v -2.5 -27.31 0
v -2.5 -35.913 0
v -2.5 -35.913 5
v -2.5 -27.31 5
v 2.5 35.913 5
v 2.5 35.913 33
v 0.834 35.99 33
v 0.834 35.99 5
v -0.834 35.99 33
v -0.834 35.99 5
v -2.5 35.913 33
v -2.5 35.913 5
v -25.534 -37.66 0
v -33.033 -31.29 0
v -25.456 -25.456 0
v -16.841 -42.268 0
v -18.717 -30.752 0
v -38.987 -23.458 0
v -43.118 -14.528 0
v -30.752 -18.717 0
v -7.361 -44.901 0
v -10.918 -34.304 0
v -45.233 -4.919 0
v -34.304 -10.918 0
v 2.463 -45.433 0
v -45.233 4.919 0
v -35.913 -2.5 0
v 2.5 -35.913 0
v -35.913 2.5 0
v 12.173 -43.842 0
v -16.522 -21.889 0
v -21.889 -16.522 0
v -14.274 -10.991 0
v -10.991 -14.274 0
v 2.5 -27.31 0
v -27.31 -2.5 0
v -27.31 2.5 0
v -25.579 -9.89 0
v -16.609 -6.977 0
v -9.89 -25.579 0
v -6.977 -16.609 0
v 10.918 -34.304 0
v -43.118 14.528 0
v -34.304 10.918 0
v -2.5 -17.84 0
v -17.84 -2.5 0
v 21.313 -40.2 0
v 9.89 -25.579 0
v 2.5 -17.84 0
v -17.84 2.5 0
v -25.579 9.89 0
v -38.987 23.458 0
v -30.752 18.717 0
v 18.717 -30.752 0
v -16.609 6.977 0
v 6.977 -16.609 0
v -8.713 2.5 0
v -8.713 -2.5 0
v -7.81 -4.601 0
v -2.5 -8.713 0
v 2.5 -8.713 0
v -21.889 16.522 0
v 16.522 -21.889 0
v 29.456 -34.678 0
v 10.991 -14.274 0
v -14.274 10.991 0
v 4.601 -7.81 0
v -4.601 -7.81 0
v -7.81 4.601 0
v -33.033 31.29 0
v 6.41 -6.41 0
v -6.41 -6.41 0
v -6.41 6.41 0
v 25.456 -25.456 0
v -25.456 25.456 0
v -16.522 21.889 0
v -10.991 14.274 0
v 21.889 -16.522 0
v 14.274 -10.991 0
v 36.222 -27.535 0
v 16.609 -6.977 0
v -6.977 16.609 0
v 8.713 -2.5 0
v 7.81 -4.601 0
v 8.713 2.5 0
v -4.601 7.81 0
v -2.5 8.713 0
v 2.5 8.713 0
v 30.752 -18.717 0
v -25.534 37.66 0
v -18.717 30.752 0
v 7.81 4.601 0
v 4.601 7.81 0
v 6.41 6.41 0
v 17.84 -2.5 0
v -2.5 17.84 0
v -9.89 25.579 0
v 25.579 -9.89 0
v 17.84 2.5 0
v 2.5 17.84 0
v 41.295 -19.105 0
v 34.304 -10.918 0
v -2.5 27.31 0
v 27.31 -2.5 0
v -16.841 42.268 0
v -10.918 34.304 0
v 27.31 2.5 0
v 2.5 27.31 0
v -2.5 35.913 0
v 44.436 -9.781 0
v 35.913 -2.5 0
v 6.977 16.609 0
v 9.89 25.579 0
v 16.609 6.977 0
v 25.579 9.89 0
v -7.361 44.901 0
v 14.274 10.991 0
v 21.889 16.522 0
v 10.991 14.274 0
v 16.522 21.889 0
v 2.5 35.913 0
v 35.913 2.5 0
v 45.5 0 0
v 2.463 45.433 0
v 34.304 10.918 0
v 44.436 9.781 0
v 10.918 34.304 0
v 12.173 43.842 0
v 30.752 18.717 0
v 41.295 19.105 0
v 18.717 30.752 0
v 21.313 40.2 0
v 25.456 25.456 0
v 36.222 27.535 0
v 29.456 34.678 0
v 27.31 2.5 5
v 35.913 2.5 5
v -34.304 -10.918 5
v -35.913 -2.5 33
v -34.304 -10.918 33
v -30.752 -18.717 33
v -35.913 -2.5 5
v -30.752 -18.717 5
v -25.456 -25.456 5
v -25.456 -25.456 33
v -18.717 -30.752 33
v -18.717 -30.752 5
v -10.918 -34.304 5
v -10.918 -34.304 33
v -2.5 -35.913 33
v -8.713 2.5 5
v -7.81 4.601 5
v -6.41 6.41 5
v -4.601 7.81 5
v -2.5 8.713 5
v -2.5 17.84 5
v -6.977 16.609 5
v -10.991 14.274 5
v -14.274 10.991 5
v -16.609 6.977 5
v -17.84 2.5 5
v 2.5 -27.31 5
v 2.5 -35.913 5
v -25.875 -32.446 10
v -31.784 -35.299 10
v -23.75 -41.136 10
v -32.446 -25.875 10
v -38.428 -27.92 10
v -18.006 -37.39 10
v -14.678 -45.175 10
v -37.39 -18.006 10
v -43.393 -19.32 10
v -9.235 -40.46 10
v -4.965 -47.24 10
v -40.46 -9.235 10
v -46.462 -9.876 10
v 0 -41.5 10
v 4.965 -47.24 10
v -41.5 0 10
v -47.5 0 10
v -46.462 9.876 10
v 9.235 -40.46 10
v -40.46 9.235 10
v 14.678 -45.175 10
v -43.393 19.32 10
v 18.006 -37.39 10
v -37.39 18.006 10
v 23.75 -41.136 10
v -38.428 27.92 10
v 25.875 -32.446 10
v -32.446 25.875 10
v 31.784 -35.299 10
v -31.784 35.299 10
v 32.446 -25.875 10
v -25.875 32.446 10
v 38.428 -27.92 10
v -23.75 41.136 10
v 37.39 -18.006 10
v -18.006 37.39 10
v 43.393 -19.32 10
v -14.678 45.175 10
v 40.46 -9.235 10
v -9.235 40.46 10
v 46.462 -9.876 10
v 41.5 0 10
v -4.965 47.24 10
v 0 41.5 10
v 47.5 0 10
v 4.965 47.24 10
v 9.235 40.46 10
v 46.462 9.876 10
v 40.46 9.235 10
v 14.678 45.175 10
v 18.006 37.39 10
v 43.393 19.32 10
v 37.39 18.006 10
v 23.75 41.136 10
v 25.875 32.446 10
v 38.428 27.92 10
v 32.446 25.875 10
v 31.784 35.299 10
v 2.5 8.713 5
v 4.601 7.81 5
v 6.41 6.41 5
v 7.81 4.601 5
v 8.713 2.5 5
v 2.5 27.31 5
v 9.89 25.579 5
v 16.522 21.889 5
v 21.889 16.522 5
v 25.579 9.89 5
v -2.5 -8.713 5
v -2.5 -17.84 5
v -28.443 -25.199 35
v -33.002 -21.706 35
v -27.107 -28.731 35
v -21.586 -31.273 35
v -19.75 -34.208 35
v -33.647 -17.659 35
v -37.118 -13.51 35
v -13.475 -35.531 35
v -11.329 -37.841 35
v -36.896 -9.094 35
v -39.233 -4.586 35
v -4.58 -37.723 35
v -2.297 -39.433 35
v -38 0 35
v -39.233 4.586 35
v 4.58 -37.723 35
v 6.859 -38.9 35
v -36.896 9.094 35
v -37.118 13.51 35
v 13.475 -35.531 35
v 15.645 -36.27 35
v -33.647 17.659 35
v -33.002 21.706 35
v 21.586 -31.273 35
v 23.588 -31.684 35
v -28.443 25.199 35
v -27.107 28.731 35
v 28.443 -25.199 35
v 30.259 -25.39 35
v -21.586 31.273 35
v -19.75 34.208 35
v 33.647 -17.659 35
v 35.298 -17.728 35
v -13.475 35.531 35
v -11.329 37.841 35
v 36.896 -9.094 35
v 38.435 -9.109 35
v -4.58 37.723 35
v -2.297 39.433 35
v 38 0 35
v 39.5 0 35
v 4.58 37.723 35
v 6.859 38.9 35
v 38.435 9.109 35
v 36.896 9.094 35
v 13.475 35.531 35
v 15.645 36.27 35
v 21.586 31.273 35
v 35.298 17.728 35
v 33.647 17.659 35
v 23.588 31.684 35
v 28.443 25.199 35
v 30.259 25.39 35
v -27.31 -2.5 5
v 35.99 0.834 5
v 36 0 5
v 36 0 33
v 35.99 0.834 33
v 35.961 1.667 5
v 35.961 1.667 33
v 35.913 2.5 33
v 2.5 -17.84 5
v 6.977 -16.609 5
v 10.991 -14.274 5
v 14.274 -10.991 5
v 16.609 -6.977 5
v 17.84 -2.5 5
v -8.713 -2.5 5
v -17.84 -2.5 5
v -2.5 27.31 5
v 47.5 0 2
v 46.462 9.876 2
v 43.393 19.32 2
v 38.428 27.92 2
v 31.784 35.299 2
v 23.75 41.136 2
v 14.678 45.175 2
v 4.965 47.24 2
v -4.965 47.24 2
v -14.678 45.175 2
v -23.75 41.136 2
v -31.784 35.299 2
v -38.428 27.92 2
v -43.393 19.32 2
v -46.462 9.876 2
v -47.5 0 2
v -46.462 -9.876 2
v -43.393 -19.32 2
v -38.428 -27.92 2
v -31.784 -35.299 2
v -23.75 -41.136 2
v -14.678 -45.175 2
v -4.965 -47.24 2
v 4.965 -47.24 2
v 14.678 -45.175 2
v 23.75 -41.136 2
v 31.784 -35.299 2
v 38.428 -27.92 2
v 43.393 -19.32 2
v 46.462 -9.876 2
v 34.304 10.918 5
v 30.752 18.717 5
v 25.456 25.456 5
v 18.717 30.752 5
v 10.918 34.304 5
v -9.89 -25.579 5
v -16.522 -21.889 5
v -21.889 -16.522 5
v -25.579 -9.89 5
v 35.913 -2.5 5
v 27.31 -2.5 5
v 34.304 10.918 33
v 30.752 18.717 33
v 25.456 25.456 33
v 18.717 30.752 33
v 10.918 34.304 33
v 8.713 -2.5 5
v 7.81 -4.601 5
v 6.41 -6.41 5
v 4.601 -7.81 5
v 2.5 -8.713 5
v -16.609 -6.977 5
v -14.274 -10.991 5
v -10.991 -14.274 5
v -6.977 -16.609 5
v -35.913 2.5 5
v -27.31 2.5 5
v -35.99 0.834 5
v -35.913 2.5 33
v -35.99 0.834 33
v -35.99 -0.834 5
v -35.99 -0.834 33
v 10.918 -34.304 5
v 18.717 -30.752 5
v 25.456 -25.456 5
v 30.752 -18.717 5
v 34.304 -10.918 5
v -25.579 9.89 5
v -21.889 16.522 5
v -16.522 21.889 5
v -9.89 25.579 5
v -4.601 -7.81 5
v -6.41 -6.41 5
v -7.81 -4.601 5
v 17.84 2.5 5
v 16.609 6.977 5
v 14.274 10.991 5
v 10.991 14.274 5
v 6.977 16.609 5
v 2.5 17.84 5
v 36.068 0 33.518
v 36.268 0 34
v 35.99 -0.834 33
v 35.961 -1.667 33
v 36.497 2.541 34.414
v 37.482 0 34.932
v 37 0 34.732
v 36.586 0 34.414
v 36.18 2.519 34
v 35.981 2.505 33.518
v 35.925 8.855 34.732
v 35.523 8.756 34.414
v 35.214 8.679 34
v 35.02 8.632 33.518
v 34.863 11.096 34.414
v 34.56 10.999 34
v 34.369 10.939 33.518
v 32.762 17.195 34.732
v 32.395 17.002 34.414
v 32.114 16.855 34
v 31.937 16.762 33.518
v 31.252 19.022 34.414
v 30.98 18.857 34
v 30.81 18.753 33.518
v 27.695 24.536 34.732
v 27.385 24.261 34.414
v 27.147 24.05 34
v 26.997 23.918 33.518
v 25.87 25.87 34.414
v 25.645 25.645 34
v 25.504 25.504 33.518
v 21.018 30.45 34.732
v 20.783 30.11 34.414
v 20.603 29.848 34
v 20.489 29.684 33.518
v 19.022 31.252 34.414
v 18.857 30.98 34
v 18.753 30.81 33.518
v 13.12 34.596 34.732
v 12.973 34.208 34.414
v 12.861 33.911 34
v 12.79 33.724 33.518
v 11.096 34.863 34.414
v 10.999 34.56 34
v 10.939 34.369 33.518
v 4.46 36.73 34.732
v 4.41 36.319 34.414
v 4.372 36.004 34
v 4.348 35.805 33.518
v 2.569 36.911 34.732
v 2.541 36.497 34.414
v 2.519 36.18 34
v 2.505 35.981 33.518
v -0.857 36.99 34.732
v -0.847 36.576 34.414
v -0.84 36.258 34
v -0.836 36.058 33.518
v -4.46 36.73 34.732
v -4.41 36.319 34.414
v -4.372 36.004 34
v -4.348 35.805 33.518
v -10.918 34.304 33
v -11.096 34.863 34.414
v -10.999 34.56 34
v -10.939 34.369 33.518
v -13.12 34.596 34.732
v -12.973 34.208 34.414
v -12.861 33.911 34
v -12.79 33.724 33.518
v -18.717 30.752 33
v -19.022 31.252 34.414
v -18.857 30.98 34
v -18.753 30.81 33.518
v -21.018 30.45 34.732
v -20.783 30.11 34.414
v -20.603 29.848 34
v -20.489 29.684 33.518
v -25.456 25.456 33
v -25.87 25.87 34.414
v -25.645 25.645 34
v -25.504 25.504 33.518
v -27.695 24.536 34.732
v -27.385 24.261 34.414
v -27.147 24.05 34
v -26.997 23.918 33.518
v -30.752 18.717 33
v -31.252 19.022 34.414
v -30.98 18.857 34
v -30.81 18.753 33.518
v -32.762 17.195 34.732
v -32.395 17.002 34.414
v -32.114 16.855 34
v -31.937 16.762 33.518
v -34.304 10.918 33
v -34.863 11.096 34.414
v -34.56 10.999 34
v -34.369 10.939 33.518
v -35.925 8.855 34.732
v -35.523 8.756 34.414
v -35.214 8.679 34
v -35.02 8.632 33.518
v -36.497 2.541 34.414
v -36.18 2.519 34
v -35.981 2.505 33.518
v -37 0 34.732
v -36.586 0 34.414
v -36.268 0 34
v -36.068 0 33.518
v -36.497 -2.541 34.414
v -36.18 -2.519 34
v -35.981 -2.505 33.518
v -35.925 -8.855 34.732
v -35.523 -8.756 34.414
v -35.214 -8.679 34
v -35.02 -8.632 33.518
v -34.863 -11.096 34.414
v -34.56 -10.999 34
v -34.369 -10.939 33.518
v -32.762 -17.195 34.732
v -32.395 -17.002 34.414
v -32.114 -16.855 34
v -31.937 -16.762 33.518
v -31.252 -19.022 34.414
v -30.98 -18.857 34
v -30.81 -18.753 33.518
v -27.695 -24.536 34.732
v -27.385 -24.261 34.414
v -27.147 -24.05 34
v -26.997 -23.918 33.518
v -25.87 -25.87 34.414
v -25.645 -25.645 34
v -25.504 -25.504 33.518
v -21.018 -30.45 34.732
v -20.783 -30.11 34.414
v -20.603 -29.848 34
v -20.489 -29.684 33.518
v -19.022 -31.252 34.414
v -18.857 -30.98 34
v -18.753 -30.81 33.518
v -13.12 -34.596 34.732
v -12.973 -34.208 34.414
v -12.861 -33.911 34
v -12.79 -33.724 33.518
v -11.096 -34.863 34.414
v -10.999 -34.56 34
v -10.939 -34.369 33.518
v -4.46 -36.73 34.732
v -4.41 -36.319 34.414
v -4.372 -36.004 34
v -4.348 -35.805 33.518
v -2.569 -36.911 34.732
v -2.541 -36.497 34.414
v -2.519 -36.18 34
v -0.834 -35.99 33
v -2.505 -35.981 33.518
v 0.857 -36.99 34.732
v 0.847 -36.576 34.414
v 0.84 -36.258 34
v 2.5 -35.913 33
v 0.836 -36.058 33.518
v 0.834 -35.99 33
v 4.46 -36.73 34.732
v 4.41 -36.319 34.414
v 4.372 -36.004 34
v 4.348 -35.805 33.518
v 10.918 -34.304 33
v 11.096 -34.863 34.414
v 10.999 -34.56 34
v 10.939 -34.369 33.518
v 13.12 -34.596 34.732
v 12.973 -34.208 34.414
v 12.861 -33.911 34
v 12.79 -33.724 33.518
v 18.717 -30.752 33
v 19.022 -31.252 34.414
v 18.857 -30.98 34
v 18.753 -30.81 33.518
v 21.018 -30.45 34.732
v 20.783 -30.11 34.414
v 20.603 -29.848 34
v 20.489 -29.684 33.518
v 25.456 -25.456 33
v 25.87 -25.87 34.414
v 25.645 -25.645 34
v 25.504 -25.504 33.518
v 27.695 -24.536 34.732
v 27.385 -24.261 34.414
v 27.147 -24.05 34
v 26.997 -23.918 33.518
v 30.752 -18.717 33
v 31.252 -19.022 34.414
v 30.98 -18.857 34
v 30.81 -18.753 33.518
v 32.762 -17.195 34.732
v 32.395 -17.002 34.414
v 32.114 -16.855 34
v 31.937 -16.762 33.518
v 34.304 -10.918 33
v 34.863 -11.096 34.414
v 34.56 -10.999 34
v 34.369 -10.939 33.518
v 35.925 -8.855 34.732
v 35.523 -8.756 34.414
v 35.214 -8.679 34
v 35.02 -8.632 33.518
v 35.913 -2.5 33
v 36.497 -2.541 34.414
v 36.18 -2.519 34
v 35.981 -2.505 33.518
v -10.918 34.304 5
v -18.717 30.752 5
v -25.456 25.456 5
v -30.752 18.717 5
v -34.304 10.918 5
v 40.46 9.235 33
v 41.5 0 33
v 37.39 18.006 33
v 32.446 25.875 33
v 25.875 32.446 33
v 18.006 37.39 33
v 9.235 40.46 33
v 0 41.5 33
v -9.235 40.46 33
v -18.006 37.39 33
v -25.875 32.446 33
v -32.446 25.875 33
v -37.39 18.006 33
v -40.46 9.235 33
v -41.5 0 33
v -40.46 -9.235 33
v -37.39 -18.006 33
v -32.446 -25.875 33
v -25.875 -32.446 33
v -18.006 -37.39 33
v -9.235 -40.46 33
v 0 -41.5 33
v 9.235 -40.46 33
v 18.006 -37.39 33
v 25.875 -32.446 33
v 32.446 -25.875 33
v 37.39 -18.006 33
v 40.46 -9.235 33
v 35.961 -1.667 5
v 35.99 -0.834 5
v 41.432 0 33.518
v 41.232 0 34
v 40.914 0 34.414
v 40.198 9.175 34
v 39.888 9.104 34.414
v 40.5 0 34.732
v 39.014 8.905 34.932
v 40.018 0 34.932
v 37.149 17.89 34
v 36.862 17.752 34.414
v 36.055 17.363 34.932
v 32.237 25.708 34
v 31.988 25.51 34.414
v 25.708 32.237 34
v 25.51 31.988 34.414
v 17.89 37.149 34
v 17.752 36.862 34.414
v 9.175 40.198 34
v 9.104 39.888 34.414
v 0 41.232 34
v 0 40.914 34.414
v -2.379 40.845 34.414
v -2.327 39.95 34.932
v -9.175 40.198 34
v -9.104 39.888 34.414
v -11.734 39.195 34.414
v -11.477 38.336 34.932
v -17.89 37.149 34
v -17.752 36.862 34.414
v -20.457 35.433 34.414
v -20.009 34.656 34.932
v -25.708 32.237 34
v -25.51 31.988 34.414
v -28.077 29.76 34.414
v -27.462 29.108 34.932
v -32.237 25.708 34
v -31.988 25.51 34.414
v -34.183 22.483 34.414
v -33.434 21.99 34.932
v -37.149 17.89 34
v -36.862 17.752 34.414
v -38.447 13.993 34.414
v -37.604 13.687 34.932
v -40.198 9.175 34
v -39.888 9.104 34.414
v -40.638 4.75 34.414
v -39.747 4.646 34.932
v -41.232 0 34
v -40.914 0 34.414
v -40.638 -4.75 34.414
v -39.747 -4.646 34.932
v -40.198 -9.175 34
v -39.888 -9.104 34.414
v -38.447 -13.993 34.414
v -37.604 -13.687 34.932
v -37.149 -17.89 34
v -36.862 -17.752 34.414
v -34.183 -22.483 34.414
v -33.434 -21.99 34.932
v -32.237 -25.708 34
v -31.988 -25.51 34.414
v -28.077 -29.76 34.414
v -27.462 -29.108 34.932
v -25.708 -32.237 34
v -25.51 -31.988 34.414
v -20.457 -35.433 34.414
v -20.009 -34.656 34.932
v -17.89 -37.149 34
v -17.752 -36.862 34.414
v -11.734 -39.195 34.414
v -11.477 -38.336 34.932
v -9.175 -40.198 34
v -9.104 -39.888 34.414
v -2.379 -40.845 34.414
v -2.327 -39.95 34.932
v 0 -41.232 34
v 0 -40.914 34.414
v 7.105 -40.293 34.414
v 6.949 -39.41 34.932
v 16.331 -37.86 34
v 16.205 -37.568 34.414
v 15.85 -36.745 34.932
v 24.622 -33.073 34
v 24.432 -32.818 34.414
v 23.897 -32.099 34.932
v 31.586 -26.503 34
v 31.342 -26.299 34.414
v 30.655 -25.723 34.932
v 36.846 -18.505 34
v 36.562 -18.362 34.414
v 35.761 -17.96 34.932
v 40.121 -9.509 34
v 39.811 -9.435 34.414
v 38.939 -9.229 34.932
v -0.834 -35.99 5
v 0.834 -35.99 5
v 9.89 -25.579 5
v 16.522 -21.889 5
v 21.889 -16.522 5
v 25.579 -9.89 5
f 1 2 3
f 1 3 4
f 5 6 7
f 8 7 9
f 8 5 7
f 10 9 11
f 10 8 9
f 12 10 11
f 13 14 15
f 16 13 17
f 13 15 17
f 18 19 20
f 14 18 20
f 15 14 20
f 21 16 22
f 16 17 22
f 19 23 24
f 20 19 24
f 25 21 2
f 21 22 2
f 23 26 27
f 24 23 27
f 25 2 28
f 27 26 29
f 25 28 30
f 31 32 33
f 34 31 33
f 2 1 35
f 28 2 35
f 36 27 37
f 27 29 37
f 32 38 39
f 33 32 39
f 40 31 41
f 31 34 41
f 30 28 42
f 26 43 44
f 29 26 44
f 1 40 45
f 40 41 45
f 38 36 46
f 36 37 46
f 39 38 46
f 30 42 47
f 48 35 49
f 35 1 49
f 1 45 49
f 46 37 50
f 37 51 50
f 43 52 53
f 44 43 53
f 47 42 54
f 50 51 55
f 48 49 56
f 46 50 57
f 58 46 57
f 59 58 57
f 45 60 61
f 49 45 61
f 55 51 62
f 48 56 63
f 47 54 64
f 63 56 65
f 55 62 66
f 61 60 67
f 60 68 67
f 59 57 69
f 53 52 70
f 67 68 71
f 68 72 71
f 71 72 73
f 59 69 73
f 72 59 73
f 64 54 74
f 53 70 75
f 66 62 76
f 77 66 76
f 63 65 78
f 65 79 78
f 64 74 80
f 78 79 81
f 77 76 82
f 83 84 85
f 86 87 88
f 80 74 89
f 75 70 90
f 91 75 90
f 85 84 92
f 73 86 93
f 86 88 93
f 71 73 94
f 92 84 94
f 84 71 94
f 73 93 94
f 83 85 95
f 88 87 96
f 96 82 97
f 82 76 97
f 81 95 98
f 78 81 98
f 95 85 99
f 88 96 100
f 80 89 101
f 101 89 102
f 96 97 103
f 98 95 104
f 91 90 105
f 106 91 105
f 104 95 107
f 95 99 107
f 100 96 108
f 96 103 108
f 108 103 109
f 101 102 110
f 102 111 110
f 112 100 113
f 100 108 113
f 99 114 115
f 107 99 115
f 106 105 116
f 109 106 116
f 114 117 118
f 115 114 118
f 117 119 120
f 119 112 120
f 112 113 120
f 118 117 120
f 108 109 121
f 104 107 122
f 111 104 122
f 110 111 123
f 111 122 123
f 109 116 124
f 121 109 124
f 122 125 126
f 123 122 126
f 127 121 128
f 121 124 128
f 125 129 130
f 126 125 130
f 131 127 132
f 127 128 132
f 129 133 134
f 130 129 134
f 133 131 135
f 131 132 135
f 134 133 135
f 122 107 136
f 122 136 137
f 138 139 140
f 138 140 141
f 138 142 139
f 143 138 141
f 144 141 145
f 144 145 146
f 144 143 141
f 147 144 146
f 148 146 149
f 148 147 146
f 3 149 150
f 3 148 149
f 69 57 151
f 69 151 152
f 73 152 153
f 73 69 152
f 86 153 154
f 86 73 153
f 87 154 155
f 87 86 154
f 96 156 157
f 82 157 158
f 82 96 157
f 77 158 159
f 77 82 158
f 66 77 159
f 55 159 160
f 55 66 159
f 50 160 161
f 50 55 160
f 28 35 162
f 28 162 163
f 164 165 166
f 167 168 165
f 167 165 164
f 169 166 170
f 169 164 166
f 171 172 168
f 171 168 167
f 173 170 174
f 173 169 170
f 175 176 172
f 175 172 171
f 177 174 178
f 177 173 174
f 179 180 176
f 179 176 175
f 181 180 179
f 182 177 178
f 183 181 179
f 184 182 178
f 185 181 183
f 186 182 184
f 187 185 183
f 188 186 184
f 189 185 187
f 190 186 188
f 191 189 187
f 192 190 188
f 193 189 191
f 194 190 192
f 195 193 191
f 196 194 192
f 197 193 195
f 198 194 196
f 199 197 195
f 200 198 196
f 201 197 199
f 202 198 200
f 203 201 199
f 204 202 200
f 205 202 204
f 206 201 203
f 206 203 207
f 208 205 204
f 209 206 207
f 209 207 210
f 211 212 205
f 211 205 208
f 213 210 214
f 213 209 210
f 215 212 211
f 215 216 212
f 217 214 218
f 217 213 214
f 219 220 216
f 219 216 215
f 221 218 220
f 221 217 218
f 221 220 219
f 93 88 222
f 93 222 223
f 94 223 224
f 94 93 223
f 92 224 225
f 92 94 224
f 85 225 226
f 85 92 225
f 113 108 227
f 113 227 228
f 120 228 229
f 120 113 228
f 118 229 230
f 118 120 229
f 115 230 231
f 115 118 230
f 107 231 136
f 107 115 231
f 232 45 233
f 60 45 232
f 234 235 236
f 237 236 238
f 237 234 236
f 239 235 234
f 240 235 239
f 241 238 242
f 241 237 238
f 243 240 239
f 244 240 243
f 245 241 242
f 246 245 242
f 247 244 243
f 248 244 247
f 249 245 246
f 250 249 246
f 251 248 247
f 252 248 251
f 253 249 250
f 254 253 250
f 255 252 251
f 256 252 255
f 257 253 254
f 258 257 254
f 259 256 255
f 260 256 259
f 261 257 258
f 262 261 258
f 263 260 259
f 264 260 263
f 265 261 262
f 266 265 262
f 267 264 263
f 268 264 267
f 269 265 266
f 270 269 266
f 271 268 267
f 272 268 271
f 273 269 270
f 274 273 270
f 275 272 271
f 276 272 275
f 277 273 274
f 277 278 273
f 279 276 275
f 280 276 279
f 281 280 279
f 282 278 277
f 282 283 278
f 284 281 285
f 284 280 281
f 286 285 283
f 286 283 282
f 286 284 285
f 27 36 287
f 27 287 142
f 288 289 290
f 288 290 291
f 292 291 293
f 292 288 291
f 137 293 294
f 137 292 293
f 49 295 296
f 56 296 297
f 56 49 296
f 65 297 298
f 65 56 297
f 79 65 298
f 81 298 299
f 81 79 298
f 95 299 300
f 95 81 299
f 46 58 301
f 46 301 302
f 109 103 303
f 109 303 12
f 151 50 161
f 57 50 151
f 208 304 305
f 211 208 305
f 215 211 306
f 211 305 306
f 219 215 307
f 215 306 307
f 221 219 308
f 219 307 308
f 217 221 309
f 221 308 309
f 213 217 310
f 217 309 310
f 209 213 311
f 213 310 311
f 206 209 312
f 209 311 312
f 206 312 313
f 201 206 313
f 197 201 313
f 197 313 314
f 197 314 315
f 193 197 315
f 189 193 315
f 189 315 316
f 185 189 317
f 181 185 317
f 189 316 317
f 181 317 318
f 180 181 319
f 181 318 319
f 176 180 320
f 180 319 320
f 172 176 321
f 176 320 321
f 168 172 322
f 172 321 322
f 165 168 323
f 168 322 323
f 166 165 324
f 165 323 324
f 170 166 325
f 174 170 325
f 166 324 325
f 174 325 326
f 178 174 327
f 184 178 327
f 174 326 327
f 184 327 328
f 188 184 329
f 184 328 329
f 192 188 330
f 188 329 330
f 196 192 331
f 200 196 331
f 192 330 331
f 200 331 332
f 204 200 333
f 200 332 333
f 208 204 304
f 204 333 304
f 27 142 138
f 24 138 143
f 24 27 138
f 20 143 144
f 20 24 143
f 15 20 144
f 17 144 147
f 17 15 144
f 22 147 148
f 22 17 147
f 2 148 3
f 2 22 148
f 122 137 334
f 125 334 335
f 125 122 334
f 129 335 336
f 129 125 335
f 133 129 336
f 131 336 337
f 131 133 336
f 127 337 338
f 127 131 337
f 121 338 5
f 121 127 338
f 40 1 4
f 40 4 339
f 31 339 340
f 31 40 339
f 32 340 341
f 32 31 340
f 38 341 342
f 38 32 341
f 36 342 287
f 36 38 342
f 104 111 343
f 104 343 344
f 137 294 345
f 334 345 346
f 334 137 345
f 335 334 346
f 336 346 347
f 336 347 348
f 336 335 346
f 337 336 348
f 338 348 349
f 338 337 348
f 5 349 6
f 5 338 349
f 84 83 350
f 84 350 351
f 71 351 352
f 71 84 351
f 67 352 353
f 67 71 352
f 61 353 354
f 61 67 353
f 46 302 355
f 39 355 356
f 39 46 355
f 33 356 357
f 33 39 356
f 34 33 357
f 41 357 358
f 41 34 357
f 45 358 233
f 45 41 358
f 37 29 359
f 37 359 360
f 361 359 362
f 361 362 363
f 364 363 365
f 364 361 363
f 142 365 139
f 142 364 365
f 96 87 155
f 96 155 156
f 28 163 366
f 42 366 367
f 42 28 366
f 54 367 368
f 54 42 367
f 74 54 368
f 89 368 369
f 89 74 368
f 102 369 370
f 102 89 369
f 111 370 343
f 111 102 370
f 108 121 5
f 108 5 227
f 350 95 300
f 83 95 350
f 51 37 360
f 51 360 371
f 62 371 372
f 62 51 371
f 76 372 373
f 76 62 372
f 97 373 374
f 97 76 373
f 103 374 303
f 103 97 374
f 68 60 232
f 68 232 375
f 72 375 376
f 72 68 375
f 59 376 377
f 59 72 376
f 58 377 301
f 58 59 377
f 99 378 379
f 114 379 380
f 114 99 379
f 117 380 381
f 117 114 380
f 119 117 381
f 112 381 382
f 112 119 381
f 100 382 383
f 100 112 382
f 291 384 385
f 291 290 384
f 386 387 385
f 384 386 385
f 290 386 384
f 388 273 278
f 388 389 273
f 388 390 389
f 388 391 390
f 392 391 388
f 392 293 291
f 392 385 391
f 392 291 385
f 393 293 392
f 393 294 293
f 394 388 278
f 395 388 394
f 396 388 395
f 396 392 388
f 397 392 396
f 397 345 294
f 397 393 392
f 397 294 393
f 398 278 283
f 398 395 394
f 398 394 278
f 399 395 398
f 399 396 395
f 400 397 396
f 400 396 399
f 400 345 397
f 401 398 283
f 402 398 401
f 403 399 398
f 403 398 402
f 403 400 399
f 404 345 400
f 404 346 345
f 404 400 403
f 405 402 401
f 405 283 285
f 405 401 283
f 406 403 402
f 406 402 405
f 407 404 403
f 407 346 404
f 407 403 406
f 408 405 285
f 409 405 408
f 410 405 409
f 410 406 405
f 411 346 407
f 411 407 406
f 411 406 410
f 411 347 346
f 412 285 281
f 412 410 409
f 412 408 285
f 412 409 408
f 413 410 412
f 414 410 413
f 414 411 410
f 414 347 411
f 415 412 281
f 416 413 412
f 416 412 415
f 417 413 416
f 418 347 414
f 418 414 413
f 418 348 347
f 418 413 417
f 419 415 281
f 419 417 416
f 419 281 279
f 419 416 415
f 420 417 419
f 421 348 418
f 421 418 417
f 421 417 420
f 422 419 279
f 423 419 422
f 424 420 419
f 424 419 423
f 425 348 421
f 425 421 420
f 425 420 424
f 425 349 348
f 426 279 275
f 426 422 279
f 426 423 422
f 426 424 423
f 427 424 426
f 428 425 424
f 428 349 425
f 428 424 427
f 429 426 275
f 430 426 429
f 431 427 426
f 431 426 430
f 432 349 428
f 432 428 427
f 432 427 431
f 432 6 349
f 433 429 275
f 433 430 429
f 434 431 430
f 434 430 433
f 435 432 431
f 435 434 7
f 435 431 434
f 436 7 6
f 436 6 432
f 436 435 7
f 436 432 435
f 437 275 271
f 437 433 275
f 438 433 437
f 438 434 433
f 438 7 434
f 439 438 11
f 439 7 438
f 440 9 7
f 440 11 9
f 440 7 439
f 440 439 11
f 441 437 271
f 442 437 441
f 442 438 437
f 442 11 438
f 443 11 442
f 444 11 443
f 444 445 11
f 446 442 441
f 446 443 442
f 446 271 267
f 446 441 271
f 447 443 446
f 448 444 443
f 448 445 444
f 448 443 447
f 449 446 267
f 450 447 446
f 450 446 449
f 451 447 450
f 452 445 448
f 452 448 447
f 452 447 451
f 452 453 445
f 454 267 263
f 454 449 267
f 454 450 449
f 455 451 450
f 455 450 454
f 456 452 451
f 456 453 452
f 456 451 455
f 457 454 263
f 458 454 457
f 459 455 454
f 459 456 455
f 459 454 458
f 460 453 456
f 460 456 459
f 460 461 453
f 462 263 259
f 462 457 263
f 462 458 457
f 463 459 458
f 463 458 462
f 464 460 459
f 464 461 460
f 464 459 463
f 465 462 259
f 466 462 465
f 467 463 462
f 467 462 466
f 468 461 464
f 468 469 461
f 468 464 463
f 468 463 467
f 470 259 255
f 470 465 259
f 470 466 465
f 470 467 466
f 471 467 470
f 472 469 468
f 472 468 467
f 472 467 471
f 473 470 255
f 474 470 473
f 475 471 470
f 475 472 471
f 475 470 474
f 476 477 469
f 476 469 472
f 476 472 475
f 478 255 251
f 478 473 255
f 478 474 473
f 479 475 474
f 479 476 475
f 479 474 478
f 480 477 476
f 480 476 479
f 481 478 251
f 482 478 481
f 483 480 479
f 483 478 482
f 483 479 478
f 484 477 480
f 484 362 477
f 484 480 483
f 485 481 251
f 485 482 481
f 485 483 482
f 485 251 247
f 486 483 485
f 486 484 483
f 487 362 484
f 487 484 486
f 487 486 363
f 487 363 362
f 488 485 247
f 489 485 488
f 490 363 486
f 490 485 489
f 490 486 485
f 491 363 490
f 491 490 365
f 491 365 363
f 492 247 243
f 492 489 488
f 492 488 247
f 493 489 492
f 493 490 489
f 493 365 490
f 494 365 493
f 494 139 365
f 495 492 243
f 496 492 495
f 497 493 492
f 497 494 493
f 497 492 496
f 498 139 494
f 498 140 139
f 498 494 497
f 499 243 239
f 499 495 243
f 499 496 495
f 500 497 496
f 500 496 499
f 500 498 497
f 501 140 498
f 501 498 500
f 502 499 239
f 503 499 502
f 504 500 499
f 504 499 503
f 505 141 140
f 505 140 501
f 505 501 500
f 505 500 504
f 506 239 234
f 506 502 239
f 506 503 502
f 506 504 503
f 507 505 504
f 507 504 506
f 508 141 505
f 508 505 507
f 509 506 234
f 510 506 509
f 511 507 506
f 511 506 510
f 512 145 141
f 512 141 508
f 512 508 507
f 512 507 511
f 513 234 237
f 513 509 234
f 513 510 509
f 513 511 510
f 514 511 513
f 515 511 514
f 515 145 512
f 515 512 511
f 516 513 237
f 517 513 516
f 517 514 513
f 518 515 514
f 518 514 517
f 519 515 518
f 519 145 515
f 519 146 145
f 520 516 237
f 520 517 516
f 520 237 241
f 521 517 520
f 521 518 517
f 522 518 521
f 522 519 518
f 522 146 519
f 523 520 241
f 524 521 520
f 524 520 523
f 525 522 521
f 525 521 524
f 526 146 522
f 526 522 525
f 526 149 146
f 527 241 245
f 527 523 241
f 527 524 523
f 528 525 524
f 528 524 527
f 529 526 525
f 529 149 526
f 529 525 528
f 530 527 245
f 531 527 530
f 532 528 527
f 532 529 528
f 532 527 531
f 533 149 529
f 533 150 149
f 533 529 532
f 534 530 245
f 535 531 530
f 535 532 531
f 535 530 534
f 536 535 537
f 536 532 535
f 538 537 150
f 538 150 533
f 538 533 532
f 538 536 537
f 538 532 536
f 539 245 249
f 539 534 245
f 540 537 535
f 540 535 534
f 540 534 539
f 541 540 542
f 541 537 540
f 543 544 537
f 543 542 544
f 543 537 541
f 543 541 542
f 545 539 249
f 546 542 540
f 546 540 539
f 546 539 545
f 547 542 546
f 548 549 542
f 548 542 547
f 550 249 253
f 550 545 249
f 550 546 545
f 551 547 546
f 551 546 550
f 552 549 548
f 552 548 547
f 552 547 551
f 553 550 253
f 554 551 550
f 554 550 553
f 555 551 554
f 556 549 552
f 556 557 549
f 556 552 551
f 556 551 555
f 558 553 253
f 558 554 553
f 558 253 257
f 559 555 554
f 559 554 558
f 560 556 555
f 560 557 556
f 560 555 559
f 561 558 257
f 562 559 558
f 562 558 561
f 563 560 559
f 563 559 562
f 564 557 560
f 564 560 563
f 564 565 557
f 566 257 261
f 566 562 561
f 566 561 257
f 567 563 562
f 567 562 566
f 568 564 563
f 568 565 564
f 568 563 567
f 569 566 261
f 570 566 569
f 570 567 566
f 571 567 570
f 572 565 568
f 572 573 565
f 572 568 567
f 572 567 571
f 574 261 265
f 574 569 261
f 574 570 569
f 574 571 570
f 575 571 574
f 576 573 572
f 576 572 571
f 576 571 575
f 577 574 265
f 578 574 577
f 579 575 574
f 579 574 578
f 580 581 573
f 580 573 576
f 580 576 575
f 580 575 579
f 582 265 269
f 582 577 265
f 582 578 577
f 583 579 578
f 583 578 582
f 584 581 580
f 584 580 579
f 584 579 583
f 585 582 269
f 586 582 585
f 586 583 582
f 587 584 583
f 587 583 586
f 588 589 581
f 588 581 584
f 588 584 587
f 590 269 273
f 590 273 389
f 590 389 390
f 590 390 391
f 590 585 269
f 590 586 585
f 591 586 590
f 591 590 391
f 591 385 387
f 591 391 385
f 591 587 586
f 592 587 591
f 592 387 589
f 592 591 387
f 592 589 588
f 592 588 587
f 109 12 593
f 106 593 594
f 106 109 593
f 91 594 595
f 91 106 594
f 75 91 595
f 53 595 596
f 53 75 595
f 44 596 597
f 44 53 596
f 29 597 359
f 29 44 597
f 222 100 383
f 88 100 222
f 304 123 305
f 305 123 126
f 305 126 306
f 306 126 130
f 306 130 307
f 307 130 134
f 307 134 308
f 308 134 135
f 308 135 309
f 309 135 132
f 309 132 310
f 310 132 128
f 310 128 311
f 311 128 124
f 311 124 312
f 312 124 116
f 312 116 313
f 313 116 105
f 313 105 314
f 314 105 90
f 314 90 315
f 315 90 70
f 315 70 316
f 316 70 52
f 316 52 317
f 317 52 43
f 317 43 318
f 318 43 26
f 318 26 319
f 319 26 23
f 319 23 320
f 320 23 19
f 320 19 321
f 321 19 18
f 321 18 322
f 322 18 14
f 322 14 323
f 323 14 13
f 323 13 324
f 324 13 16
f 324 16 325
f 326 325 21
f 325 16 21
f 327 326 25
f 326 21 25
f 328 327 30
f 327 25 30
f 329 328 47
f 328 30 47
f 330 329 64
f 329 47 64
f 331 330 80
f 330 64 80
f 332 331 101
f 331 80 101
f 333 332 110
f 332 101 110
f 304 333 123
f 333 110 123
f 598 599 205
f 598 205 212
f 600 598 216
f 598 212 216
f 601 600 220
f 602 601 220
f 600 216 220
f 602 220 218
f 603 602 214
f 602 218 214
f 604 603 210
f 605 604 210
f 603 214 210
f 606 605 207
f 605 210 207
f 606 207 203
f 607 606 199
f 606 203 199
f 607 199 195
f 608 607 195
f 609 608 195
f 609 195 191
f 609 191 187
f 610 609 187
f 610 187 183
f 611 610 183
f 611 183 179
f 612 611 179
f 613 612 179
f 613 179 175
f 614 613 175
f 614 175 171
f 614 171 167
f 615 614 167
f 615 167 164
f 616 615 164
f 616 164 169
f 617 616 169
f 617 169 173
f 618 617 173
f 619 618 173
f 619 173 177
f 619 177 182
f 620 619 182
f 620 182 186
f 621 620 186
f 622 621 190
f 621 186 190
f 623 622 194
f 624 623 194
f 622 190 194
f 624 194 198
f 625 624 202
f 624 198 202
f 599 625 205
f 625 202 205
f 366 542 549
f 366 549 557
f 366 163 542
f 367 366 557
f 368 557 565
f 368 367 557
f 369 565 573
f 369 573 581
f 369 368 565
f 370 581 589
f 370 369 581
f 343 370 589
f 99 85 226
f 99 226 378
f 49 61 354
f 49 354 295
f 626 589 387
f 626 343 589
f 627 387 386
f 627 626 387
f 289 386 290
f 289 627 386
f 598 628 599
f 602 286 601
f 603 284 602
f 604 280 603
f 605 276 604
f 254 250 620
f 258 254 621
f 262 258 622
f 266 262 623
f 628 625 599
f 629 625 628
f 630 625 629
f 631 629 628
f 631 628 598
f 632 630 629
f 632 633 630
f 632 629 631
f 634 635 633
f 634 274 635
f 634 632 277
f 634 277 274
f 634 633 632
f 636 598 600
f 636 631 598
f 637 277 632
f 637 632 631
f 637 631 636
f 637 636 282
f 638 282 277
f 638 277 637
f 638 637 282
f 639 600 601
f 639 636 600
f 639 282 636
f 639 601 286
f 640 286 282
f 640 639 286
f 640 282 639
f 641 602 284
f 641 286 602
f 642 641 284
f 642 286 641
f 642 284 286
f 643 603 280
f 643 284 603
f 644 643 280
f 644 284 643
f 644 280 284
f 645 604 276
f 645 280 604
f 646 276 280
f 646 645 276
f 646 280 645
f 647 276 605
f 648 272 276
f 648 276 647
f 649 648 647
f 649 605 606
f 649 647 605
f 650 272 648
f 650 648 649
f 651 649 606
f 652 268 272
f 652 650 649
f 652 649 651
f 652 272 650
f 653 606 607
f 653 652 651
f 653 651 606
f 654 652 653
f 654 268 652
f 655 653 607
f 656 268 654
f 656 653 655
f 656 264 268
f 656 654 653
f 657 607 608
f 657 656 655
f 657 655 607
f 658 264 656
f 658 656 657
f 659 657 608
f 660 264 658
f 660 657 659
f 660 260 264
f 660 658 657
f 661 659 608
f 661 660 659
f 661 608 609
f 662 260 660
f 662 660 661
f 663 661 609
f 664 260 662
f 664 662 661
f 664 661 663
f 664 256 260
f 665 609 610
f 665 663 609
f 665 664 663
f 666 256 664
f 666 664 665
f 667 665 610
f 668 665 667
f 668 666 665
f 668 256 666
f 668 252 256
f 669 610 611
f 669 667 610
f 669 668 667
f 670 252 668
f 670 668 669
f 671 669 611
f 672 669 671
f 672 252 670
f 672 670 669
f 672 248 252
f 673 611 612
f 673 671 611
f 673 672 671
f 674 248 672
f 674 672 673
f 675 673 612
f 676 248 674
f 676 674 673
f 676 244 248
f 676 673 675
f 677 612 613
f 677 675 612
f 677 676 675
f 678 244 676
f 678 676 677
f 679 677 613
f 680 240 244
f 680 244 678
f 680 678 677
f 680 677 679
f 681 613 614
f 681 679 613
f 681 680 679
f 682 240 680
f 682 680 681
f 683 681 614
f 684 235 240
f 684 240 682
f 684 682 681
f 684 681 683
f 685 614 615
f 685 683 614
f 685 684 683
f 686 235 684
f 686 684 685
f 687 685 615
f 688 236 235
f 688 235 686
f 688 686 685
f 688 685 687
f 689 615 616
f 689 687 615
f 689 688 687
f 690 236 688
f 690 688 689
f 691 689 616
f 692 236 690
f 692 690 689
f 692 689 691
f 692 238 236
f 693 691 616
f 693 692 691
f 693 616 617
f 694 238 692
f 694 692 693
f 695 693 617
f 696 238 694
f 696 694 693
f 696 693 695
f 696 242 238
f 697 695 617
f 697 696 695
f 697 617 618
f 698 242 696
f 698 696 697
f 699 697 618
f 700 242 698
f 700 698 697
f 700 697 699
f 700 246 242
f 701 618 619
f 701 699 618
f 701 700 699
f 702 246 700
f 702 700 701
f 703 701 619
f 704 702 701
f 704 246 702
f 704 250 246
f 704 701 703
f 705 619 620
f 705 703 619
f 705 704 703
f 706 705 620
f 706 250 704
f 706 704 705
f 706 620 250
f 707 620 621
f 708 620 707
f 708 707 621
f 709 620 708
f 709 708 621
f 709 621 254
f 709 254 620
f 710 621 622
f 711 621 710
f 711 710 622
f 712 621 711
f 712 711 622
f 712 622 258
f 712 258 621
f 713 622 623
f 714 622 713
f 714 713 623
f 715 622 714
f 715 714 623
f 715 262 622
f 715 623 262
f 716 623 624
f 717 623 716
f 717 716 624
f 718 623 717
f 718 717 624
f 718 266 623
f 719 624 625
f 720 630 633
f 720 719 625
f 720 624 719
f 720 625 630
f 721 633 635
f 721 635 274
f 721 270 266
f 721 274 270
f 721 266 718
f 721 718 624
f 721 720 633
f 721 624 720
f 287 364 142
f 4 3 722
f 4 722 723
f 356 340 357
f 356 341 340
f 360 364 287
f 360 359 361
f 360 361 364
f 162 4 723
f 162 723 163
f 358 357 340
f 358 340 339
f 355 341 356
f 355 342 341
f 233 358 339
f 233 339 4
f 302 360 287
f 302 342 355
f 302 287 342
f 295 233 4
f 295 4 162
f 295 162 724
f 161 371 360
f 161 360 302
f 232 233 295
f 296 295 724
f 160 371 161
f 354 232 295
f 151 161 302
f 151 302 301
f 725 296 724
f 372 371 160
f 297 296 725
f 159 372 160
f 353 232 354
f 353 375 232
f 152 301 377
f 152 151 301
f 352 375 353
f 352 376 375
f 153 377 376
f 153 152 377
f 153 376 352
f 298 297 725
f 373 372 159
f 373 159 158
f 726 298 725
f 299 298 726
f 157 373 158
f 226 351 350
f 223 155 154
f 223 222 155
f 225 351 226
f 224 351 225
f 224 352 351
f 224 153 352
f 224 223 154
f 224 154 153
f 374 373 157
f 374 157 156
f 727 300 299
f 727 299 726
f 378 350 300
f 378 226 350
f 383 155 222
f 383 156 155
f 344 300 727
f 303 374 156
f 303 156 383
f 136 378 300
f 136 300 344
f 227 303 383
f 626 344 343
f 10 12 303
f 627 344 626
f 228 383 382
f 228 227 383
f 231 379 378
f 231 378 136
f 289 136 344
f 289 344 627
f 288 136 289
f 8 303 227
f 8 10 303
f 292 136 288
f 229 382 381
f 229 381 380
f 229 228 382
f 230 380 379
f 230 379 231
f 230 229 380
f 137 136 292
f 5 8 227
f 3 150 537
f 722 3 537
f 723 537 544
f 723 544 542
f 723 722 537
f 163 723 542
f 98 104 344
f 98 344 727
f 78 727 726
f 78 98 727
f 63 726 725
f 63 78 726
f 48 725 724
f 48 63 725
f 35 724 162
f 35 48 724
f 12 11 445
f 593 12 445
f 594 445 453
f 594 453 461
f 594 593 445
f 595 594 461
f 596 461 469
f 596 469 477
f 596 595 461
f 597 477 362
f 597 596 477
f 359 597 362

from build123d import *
from build123d import SkipClean  # not in build123d's __all__

# Parameters (mm, degrees)
F0_R     = 41.5
F0_R_2   = 36
F1_DEPTH = 35
F0_R_3   = 47.5
F2_DEPTH = 10
F3_DEPTH = 5
F4_R     = 2
F5_SIZE  = 2
F7_DEPTH = 40.1


with BuildPart() as f1:
    # F0 (on Top) → F1 (new body)
    with BuildSketch(Plane.XY):
        Circle(F0_R)
        Circle(F0_R_2, mode=Mode.SUBTRACT)
    extrude(amount=F1_DEPTH)

    # F0 (on Top) → F2 (join)
    with BuildSketch(Plane.XY):
        Circle(F0_R_3)
        Circle(F0_R, mode=Mode.SUBTRACT)
    extrude(amount=F2_DEPTH)

    # F0 (on Top) → F3 (join)
    with BuildSketch(Plane.XY):
        Circle(F0_R_2)
    extrude(amount=F3_DEPTH)

    # F4
    f4_edges = [f1.edges().sort_by_distance(p)[0] for p in [
        (-41.5, 0, 35),
        (-36, 0, 35),
    ]]
    fillet(f4_edges, radius=F4_R)

    # F5
    f5_edges = [f1.edges().sort_by_distance(p)[0] for p in [
        (-47.5, 0, 0),
    ]]
    chamfer(f5_edges, length=F5_SIZE)

    # F6 (on face) → F7 (cut)
    with BuildSketch(Plane.XY):
        with BuildLine():
            ThreePointArc((27.3098579389, -2.5), (19.3917294309, -19.3917294309), (2.5, -27.3098579389))
            Line((2.5, -27.3098579389), (2.5, -35.9130895357))
            ThreePointArc((2.5, -35.9130895357), (25.4558441227, -25.4558441227), (35.9130895357, -2.5))
            Line((35.9130895357, -2.5), (27.3098579389, -2.5))
        make_face()
        with BuildLine():
            Line((-2.5, -35.9130895357), (-2.5, -27.3098579389))
            ThreePointArc((-2.5, -27.3098579389), (-19.3917294309, -19.3917294309), (-27.3098579389, -2.5))
            Line((-27.3098579389, -2.5), (-35.9130895357, -2.5))
            ThreePointArc((-35.9130895357, -2.5), (-25.4558441227, -25.4558441227), (-2.5, -35.9130895357))
        make_face()
        with BuildLine():
            ThreePointArc((-27.3098579389, 2.5), (-19.3917294309, 19.3917294309), (-2.5, 27.3098579389))
            Line((-2.5, 27.3098579389), (-2.5, 35.9130895357))
            ThreePointArc((-2.5, 35.9130895357), (-25.4558441227, 25.4558441227), (-35.9130895357, 2.5))
            Line((-35.9130895357, 2.5), (-27.3098579389, 2.5))
        make_face()
        with BuildLine():
            Line((2.5, 35.9130895357), (2.5, 27.3098579389))
            ThreePointArc((2.5, 27.3098579389), (19.3917294309, 19.3917294309), (27.3098579389, 2.5))
            Line((27.3098579389, 2.5), (35.9130895357, 2.5))
            ThreePointArc((35.9130895357, 2.5), (25.4558441227, 25.4558441227), (2.5, 35.9130895357))
        make_face()
        with BuildLine():
            Line((2.5, 17.8404992818), (2.5, 8.7134999292))
            ThreePointArc((2.5, 8.7134999292), (6.4099563577, 6.4099563577), (8.7134999292, 2.5))
            Line((8.7134999292, 2.5), (17.8404992818, 2.5))
            ThreePointArc((17.8404992818, 2.5), (12.7383950053, 12.7383950053), (2.5, 17.8404992818))
        make_face()
        with BuildLine():
            ThreePointArc((8.7134999292, -2.5), (6.4099563577, -6.4099563577), (2.5, -8.7134999292))
            Line((2.5, -8.7134999292), (2.5, -17.8404992818))
            ThreePointArc((2.5, -17.8404992818), (12.7383950053, -12.7383950053), (17.8404992818, -2.5))
            Line((17.8404992818, -2.5), (8.7134999292, -2.5))
        make_face()
        with BuildLine():
            Line((-2.5, -17.8404992818), (-2.5, -8.7134999292))
            ThreePointArc((-2.5, -8.7134999292), (-6.4099563577, -6.4099563577), (-8.7134999292, -2.5))
            Line((-8.7134999292, -2.5), (-17.8404992818, -2.5))
            ThreePointArc((-17.8404992818, -2.5), (-12.7383950053, -12.7383950053), (-2.5, -17.8404992818))
        make_face()
        with BuildLine():
            ThreePointArc((-8.7134999292, 2.5), (-6.4099563577, 6.4099563577), (-2.5, 8.7134999292))
            Line((-2.5, 8.7134999292), (-2.5, 17.8404992818))
            ThreePointArc((-2.5, 17.8404992818), (-12.7383950053, 12.7383950053), (-17.8404992818, 2.5))
            Line((-17.8404992818, 2.5), (-8.7134999292, 2.5))
        make_face()
    with SkipClean():  # cleaning this boolean's faces spoils the solid; the shape is the same uncleaned
        extrude(amount=F7_DEPTH, mode=Mode.SUBTRACT)


solid = f1.part
